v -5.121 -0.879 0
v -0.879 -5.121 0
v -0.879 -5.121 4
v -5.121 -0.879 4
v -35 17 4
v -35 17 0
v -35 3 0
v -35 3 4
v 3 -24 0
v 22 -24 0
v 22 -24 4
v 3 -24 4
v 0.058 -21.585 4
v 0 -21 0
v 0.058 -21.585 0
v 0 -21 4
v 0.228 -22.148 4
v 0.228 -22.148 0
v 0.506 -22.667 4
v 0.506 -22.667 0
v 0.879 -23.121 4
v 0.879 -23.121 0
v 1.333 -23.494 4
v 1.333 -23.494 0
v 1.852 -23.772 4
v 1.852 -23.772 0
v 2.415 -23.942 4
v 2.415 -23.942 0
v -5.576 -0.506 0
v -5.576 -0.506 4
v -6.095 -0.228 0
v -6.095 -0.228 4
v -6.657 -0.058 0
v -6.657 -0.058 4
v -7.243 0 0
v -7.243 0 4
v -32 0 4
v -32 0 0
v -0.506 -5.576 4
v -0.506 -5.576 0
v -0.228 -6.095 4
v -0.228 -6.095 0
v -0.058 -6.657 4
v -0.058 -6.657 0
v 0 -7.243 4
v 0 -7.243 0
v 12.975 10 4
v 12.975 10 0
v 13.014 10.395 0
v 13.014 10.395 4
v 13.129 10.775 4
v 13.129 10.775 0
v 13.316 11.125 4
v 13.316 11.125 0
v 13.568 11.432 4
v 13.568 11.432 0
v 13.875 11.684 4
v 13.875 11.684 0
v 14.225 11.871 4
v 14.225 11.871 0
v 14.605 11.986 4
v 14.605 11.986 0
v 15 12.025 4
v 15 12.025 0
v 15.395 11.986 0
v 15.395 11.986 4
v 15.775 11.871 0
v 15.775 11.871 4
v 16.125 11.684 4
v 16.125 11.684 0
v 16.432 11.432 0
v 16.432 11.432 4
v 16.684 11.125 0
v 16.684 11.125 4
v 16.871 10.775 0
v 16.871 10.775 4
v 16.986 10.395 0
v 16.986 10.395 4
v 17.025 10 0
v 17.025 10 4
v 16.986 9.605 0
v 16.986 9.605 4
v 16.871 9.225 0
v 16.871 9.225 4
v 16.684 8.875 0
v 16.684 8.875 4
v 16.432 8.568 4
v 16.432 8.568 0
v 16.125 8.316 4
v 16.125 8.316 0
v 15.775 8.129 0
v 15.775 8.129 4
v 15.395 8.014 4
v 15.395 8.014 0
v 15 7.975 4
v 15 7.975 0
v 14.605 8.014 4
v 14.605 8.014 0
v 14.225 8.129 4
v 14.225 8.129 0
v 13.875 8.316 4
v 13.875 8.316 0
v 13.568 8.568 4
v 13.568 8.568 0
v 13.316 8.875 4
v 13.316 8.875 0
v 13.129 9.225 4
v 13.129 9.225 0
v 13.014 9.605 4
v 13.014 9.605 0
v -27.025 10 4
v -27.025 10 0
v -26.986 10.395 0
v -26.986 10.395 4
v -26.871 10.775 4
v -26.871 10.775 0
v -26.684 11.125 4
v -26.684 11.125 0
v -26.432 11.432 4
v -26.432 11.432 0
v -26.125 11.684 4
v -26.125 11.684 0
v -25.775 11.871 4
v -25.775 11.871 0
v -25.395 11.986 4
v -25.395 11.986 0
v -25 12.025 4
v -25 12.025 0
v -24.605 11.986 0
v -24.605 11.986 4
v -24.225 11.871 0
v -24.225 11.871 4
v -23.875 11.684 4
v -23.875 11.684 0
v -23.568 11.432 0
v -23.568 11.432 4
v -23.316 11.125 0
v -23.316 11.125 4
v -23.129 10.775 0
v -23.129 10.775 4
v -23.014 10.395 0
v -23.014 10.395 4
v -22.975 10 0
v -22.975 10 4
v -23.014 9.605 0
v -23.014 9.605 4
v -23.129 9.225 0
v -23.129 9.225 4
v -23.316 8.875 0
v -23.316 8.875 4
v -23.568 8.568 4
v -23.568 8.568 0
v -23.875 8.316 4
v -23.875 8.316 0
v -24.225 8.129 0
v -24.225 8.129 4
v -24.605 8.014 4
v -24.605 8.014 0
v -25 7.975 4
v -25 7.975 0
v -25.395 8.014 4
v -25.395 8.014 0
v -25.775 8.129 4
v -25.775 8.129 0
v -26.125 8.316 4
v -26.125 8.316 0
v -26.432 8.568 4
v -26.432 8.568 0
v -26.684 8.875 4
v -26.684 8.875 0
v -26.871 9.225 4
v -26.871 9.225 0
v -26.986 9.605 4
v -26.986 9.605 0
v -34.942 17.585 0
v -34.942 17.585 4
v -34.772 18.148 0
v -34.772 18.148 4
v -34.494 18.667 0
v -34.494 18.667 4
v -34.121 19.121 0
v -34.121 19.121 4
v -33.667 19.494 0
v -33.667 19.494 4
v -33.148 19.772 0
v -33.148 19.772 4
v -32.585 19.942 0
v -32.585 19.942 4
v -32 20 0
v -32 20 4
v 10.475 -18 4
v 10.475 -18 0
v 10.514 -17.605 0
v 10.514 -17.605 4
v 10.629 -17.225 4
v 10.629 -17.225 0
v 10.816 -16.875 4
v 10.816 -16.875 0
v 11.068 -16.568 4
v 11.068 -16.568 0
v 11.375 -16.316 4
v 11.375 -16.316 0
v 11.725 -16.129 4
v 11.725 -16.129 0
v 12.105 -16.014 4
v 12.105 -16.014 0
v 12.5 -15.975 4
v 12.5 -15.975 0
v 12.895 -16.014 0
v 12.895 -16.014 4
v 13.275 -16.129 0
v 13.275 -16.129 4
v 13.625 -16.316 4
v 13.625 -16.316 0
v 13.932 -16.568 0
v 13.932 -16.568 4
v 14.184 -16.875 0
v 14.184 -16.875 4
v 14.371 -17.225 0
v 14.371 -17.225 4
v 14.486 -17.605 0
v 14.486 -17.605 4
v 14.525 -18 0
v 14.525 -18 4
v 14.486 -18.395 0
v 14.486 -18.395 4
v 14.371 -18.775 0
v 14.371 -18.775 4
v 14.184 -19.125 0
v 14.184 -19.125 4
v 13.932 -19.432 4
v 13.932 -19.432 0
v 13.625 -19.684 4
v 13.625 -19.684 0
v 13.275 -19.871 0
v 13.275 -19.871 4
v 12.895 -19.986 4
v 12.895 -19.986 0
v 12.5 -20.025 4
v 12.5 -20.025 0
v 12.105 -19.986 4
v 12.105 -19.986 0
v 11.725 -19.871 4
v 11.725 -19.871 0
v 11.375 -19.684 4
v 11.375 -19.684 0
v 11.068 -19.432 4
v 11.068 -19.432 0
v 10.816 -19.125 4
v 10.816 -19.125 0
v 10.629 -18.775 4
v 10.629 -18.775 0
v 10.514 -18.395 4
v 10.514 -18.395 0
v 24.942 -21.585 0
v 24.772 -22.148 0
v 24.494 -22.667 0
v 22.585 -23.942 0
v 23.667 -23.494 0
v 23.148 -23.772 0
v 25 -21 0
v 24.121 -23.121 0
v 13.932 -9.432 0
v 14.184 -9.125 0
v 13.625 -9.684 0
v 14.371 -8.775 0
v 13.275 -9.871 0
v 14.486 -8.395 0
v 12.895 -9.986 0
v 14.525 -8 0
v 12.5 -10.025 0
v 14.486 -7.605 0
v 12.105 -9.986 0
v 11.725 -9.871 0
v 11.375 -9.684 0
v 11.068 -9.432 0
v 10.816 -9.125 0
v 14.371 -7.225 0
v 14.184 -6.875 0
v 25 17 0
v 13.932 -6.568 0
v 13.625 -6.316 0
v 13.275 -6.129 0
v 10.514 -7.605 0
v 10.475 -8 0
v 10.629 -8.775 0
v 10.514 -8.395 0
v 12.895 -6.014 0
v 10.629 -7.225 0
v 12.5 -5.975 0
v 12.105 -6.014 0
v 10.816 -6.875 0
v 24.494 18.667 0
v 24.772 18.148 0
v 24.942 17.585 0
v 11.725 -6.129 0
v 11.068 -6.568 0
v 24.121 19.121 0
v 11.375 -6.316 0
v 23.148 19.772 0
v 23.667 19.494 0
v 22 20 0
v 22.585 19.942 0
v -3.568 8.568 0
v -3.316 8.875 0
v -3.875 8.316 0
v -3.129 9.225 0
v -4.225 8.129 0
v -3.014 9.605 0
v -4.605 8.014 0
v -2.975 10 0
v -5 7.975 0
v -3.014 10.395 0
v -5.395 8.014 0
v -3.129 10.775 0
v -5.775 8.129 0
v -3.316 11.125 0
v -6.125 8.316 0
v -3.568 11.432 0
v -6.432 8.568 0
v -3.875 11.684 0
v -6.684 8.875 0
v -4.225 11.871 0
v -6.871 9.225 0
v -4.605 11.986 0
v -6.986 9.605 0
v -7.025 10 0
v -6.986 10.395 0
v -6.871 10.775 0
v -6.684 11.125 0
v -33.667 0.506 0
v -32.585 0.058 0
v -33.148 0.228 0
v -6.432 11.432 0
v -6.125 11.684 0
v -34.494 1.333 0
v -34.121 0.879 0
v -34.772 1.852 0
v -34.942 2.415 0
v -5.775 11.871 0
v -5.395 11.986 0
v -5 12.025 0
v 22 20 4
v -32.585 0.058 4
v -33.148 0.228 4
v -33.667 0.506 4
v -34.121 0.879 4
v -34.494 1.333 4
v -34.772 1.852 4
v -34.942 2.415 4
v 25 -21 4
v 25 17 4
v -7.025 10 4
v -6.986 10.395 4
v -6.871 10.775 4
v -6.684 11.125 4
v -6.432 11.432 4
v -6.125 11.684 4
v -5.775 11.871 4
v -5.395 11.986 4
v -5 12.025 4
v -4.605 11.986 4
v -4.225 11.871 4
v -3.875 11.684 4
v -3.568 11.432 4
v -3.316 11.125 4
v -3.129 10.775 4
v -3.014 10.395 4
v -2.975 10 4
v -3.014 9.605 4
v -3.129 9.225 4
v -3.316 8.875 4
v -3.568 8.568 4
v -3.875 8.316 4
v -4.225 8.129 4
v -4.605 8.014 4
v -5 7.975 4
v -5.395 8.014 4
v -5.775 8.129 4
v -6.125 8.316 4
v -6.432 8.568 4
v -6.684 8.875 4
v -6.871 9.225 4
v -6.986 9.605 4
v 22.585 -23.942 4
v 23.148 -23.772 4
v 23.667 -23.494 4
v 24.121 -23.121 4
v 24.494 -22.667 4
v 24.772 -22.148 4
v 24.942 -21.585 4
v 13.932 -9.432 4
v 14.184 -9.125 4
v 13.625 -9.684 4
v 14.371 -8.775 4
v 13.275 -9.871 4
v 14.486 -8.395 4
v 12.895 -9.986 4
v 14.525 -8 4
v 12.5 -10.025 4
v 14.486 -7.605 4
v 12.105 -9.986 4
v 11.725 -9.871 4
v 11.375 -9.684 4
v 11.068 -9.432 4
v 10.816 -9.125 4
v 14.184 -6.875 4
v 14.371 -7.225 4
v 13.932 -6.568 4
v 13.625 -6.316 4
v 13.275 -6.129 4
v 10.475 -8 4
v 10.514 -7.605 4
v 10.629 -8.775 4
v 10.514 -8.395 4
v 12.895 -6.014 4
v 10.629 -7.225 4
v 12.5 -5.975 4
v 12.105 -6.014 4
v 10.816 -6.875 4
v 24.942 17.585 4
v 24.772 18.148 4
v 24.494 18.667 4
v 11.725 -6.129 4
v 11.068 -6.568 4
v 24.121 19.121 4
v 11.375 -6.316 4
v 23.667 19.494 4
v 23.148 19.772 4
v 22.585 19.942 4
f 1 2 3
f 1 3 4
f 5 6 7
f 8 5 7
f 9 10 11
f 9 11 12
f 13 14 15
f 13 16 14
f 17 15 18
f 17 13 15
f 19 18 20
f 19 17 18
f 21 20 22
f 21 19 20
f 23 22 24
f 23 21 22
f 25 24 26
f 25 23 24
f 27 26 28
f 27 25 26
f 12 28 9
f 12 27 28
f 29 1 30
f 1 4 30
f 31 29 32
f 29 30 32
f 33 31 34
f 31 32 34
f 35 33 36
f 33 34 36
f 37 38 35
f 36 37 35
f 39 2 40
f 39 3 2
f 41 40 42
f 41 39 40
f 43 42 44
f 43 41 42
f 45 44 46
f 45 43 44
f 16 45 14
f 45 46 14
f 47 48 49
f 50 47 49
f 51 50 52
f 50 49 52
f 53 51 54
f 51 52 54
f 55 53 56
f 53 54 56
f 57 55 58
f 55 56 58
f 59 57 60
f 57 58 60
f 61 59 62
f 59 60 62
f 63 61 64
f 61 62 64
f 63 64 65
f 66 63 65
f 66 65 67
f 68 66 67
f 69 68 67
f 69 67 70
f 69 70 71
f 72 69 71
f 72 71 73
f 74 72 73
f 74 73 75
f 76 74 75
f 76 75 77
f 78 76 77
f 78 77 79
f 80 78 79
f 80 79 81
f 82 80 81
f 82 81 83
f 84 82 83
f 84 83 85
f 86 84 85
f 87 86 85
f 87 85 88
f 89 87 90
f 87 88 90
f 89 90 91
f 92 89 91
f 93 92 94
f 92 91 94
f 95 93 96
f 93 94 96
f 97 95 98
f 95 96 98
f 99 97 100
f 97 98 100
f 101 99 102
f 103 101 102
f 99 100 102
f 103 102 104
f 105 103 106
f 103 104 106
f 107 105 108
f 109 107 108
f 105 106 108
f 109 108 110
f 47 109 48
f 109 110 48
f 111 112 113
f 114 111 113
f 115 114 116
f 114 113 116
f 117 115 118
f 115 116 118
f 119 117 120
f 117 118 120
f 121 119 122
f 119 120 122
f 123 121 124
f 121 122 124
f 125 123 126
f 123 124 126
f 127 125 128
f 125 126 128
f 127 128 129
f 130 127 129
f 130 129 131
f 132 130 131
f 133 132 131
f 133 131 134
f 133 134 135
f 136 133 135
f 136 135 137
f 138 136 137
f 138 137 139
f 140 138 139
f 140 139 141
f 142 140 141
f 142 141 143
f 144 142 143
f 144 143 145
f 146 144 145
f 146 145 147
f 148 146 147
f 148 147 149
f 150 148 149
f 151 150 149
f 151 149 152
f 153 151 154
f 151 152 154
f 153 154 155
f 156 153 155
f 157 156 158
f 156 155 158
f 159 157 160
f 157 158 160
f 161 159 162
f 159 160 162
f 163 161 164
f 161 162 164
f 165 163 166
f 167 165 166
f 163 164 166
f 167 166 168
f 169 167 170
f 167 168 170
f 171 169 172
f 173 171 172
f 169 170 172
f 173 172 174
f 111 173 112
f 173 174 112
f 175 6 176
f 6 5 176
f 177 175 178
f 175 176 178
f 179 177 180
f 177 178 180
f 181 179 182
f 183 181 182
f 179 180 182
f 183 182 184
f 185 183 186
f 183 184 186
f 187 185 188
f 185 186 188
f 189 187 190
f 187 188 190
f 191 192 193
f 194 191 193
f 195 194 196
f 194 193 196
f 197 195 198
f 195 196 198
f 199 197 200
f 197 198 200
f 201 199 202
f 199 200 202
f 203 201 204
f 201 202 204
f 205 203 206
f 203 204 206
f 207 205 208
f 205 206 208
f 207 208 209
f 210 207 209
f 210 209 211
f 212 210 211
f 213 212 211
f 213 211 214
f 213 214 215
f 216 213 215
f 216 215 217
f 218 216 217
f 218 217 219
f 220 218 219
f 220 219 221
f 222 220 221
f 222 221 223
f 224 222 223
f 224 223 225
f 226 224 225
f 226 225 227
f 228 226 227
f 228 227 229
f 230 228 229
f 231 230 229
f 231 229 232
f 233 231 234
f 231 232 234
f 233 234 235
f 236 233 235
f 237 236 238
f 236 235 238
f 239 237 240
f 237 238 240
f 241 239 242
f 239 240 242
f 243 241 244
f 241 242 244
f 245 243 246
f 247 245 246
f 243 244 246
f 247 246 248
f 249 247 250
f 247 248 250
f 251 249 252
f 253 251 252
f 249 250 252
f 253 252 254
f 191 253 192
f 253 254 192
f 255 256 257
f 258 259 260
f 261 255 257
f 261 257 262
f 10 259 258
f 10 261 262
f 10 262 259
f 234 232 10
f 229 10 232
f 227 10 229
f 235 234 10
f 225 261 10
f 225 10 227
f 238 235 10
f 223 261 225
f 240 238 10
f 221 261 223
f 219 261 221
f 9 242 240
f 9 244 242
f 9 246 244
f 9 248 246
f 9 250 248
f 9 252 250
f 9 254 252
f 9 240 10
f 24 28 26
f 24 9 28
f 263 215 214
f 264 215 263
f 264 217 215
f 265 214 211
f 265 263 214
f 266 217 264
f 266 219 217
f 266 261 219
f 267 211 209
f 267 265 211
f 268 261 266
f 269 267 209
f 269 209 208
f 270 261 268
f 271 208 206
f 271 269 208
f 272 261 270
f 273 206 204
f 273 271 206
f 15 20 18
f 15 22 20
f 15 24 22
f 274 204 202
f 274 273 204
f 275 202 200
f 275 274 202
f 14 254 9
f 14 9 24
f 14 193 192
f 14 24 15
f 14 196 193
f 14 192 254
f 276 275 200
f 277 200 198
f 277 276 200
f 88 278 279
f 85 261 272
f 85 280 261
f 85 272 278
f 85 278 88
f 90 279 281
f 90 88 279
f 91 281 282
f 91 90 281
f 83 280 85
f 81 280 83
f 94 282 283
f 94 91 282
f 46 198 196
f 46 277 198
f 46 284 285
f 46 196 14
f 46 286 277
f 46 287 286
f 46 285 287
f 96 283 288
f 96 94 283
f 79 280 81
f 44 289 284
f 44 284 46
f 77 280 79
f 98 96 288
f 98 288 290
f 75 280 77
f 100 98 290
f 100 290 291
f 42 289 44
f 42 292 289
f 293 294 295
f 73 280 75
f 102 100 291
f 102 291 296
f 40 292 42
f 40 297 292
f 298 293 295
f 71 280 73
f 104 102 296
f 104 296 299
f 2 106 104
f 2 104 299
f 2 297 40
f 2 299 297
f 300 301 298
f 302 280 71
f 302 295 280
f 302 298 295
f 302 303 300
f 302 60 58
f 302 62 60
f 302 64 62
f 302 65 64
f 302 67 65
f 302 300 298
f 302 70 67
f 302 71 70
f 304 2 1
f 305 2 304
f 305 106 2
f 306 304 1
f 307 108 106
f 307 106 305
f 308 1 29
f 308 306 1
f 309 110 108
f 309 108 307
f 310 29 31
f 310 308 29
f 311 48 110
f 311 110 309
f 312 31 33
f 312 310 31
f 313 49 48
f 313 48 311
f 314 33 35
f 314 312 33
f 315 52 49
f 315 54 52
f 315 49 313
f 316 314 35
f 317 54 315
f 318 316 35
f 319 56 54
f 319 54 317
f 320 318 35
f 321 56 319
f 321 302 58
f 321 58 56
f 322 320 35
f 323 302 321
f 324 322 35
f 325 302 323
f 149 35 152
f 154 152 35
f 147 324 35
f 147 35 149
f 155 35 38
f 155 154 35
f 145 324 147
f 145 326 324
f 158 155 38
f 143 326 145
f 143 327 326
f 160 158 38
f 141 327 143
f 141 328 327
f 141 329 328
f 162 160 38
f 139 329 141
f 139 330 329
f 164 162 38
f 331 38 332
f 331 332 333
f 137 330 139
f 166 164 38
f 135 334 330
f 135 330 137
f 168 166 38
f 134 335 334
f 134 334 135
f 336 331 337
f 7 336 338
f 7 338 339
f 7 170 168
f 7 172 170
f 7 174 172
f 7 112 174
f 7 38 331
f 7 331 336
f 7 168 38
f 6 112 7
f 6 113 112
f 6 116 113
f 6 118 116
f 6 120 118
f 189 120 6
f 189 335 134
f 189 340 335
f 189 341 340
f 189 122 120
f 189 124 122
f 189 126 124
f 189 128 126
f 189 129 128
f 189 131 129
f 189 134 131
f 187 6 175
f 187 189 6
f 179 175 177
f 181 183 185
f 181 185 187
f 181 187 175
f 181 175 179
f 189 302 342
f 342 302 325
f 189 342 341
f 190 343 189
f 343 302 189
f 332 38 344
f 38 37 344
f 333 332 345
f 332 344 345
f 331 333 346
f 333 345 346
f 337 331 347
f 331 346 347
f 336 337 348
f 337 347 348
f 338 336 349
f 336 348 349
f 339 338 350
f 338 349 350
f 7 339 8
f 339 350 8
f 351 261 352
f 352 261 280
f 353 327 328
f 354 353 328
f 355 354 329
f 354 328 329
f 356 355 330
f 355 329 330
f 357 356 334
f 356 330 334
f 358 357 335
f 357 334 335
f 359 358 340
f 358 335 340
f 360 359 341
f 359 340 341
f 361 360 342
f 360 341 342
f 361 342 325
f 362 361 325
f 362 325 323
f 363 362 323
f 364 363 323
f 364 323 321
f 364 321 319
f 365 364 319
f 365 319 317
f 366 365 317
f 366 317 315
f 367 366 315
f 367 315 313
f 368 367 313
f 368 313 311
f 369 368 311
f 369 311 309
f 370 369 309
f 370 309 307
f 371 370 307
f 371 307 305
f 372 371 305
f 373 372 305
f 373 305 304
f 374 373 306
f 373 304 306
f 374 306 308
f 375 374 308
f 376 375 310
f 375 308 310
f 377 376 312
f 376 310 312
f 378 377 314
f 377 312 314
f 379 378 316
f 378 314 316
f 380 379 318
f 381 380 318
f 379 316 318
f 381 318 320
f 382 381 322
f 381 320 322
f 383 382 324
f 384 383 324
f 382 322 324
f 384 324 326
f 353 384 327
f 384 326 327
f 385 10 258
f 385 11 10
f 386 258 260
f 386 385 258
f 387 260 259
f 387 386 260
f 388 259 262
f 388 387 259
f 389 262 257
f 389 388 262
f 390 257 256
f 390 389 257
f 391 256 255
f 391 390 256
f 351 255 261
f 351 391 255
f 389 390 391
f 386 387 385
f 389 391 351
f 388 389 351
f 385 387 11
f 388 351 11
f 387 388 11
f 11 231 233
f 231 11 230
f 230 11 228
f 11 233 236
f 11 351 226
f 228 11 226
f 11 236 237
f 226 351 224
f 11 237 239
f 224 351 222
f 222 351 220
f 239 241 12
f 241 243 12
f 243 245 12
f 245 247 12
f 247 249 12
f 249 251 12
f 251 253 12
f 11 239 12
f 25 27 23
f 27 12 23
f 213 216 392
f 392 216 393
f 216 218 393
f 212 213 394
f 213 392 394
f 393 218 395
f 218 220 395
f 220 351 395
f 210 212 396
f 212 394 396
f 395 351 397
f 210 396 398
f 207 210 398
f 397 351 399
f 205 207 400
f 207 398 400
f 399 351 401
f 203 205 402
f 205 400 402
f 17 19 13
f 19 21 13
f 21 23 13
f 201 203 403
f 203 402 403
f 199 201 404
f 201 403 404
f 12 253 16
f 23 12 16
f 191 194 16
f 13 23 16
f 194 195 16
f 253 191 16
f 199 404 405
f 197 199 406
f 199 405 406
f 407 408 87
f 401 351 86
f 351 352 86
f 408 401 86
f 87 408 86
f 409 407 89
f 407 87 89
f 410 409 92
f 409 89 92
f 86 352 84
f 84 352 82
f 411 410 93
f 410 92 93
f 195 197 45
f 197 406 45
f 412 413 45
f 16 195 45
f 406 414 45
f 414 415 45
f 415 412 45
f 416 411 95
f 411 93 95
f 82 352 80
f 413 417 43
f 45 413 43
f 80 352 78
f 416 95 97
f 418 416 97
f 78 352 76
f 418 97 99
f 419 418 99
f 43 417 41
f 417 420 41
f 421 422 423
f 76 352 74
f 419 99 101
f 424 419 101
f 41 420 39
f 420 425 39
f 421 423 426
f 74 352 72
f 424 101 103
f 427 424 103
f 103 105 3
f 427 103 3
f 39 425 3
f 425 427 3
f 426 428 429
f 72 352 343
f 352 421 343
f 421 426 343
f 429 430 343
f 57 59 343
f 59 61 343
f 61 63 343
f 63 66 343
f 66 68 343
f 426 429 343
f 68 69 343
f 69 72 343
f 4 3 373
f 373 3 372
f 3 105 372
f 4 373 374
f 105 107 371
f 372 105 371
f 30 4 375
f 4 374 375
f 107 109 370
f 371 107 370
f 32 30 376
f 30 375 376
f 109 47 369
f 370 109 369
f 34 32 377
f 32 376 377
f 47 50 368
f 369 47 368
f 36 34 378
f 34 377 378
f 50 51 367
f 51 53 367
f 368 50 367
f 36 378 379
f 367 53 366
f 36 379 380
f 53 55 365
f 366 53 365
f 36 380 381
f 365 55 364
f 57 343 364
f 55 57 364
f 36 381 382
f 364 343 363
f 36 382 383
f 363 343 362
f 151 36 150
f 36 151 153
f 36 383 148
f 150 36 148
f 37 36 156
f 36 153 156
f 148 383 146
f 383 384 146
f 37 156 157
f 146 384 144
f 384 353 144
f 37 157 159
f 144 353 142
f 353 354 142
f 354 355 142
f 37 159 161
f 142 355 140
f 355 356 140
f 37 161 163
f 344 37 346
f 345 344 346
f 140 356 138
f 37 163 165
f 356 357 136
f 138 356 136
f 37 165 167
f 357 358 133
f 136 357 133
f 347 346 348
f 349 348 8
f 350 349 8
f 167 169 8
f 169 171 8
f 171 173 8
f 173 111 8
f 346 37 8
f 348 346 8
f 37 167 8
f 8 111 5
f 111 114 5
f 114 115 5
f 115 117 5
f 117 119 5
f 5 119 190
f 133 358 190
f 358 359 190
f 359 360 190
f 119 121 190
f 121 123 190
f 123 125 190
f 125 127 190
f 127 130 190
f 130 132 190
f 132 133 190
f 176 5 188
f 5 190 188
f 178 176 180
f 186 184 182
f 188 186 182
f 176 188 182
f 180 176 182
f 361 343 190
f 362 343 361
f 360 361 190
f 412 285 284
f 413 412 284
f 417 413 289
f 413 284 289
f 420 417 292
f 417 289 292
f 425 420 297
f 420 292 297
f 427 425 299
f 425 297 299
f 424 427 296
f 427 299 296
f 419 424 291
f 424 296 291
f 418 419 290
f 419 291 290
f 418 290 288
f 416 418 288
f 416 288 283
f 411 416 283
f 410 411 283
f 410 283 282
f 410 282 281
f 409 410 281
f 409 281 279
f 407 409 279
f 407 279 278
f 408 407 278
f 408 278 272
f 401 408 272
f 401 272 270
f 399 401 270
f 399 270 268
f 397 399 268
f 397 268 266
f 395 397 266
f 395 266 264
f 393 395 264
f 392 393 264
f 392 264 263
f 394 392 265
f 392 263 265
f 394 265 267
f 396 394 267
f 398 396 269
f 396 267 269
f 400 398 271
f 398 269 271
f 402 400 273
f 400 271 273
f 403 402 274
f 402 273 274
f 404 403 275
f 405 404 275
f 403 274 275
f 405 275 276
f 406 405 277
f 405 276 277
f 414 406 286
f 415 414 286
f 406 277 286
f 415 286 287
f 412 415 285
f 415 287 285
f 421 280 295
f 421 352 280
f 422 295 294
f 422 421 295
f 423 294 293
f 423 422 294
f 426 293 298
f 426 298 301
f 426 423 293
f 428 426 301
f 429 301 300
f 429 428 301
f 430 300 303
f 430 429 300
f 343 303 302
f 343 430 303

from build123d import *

# Parameters (mm, degrees)
EXTRUDE_1_DEPTH          = 4
EXTRUDE_2_DEPTH          = 4
SKETCH_3_R               = 5
CUT_EXTRUDE_1_DEPTH      = 4
SKETCH_6_W               = 25
SKETCH_6_H               = 6
CUT_EXTRUDE_4_DEPTH      = 1
CUT_EXTRUDE_4_DEPTH_BACK = 5
SKETCH_7_R               = 2.025
CUT_EXTRUDE_5_DEPTH      = 1
CUT_EXTRUDE_5_DEPTH_BACK = 5
SKETCH_9_R               = 5
EXTRUDE_3_DEPTH          = 4
SKETCH_12_R              = 2.025
CUT_EXTRUDE_8_DEPTH      = 1
CUT_EXTRUDE_8_DEPTH_BACK = 5
CUT_EXTRUDE_9_DEPTH      = 1
CUT_EXTRUDE_9_DEPTH_BACK = 5
EXTRUDE_4_DEPTH          = 4
FILLET_1_R               = 3


with BuildPart() as part:
    # 草图1 → 凸台-拉伸1 (new body)
    with BuildSketch(Plane.XY):
        Polygon((-35, 0), (0, 0), (0, -30), (25, -30), (25, 20), (-35, 20), align=None)
    extrude(amount=EXTRUDE_1_DEPTH)

    # 草图2 → 凸台-拉伸2 (add)
    with BuildSketch(Plane(origin=(0, 0, 0), x_dir=(-1, 0, 0), z_dir=(0, 0, -1))):
        with BuildLine():
            Line((-15.347247215, 38.473341973), (-25, 20))
            Line((-25, 20), (7.6, 20))
            Line((7.6, 20), (-2.052752785, 38.473341973))
            ThreePointArc((-2.052752785, 38.473341973), (-8.7, 42.5), (-15.347247215, 38.473341973))
        make_face()
    extrude(amount=-EXTRUDE_2_DEPTH)

    # 草图3 → 切除-拉伸1 (cut)
    with BuildSketch(Plane(origin=(0, 0, 0), x_dir=(-1, 0, 0), z_dir=(0, 0, -1))):
        with Locations((-8.7, 35)):
            Circle(SKETCH_3_R)
    extrude(amount=-CUT_EXTRUDE_1_DEPTH, mode=Mode.SUBTRACT)

    # 草图6 → 切除-拉伸4 (cut, two sides)
    with BuildSketch(Plane(origin=(0, 0, 0), x_dir=(-1, 0, 0), z_dir=(0, 0, -1))) as cut_extrude_4_sk:
        with Locations((-12.5, -27)):
            Rectangle(SKETCH_6_W, SKETCH_6_H)
    extrude(amount=CUT_EXTRUDE_4_DEPTH, mode=Mode.SUBTRACT)
    extrude(cut_extrude_4_sk.sketch, amount=-CUT_EXTRUDE_4_DEPTH_BACK, mode=Mode.SUBTRACT)

    # 草图7 → 切除-拉伸5 (cut, two sides)
    with BuildSketch(Plane(origin=(0, 0, 0), x_dir=(-1, 0, 0), z_dir=(0, 0, -1))) as cut_extrude_5_sk:
        with Locations((-12.5, -8)):
            Circle(SKETCH_7_R)
        with Locations((-12.5, -18)):
            Circle(SKETCH_7_R)
    extrude(amount=CUT_EXTRUDE_5_DEPTH, mode=Mode.SUBTRACT)
    extrude(cut_extrude_5_sk.sketch, amount=-CUT_EXTRUDE_5_DEPTH_BACK, mode=Mode.SUBTRACT)

    # 草图9 → 凸台-拉伸3 (add)
    with BuildSketch(Plane(origin=(0, 0, 0), x_dir=(-1, 0, 0), z_dir=(0, 0, -1))):
        with BuildLine():
            Line((-20.878399595, 37.817194226), (-25, 20))
            Line((-25, 20), (7.6, 20))
            Line((7.6, 20), (3.478399595, 37.817194226))
            ThreePointArc((3.478399595, 37.817194226), (-8.7, 47.5), (-20.878399595, 37.817194226))
        make_face()
        with Locations((-8.7, 35)):
            Circle(SKETCH_9_R, mode=Mode.SUBTRACT)
    extrude(amount=-EXTRUDE_3_DEPTH)

    # 草图12 → 切除-拉伸8 (cut, two sides)
    with BuildSketch(Plane(origin=(0, 0, 0), x_dir=(-1, 0, 0), z_dir=(0, 0, -1))) as cut_extrude_8_sk:
        with Locations((-15, 10)):
            Circle(SKETCH_12_R)
        with Locations((5, 10)):
            Circle(SKETCH_12_R)
        with Locations((25, 10)):
            Circle(SKETCH_12_R)
    extrude(amount=CUT_EXTRUDE_8_DEPTH, mode=Mode.SUBTRACT)
    extrude(cut_extrude_8_sk.sketch, amount=-CUT_EXTRUDE_8_DEPTH_BACK, mode=Mode.SUBTRACT)

    # 草图13 → 切除-拉伸9 (cut, two sides)
    with BuildSketch(Plane(origin=(0, 0, 0), x_dir=(-1, 0, 0), z_dir=(0, 0, -1))) as cut_extrude_9_sk:
        with BuildLine():
            Line((-25, 20), (7.6, 20))
            Line((7.6, 20), (3.478399595, 37.817194226))
            ThreePointArc((3.478399595, 37.817194226), (-8.7, 47.5), (-20.878399595, 37.817194226))
            Line((-20.878399595, 37.817194226), (-25, 20))
        make_face()
    extrude(amount=CUT_EXTRUDE_9_DEPTH, mode=Mode.SUBTRACT)
    extrude(cut_extrude_9_sk.sketch, amount=-CUT_EXTRUDE_9_DEPTH_BACK, mode=Mode.SUBTRACT)

    # 草图14 → 凸台-拉伸4 (add)
    with BuildSketch(Plane(origin=(0, 0, 0), x_dir=(-1, 0, 0), z_dir=(0, 0, -1))):
        Polygon((0, -6), (6, 0), (0, 0), align=None)
    extrude(amount=-EXTRUDE_4_DEPTH)

    # 圆角1
    fillet_1_edges = [part.edges().sort_by_distance(p)[0] for p in [
        (-35, 20, 2),
        (25, 20, 2),
        (-35, 0, 2),
        (-6, 0, 2),
        (0, -6, 2),
        (25, -24, 2),
        (0, -24, 2),
    ]]
    fillet(fillet_1_edges, radius=FILLET_1_R)


solid = part.part
